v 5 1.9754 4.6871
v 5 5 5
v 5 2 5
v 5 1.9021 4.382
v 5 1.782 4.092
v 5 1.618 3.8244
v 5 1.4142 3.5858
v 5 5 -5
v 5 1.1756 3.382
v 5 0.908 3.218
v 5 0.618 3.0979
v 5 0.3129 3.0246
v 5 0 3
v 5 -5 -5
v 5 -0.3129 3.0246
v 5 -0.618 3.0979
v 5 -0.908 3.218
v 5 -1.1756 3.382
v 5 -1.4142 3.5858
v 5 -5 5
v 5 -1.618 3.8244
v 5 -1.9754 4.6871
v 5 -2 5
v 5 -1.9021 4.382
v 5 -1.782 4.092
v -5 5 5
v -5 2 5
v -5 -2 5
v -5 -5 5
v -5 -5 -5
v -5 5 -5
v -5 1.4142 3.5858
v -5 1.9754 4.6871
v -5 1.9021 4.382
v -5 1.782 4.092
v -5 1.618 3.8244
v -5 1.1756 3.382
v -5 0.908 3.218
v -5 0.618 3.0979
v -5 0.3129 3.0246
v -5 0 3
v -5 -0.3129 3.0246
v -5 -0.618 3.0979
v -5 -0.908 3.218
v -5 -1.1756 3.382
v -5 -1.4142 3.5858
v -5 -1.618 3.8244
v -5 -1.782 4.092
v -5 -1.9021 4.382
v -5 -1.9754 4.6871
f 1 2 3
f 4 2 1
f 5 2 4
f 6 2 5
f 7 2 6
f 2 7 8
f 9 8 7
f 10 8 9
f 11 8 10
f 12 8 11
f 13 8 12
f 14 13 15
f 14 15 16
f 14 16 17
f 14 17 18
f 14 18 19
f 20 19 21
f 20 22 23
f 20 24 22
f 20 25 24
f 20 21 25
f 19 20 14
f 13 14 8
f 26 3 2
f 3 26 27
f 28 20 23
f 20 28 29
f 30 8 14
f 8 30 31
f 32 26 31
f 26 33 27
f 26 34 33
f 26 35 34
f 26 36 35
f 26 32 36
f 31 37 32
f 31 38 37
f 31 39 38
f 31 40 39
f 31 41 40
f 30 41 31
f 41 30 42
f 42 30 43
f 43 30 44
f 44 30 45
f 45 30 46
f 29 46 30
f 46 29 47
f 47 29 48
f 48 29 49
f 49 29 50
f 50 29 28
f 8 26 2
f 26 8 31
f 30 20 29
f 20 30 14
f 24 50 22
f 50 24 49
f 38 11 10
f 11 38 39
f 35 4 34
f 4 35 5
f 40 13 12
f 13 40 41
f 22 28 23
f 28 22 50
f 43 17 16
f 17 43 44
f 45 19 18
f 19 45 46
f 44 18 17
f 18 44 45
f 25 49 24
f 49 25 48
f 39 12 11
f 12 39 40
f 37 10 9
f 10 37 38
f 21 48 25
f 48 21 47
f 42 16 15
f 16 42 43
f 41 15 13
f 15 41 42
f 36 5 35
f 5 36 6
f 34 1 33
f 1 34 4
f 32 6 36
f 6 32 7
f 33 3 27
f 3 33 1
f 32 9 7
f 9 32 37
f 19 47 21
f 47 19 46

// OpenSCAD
difference() {
    cube(10, center = true);
    translate([0, 0, 5]) {
        rotate([0, 90, 0]) {
            cylinder(r = 2, h = 20, center = true, $fn = 40);
        }
        * rotate([90, 0, 0]) {
            # cylinder(r = 2, h = 20, center = true, $fn = 40);
        }
    }
}
